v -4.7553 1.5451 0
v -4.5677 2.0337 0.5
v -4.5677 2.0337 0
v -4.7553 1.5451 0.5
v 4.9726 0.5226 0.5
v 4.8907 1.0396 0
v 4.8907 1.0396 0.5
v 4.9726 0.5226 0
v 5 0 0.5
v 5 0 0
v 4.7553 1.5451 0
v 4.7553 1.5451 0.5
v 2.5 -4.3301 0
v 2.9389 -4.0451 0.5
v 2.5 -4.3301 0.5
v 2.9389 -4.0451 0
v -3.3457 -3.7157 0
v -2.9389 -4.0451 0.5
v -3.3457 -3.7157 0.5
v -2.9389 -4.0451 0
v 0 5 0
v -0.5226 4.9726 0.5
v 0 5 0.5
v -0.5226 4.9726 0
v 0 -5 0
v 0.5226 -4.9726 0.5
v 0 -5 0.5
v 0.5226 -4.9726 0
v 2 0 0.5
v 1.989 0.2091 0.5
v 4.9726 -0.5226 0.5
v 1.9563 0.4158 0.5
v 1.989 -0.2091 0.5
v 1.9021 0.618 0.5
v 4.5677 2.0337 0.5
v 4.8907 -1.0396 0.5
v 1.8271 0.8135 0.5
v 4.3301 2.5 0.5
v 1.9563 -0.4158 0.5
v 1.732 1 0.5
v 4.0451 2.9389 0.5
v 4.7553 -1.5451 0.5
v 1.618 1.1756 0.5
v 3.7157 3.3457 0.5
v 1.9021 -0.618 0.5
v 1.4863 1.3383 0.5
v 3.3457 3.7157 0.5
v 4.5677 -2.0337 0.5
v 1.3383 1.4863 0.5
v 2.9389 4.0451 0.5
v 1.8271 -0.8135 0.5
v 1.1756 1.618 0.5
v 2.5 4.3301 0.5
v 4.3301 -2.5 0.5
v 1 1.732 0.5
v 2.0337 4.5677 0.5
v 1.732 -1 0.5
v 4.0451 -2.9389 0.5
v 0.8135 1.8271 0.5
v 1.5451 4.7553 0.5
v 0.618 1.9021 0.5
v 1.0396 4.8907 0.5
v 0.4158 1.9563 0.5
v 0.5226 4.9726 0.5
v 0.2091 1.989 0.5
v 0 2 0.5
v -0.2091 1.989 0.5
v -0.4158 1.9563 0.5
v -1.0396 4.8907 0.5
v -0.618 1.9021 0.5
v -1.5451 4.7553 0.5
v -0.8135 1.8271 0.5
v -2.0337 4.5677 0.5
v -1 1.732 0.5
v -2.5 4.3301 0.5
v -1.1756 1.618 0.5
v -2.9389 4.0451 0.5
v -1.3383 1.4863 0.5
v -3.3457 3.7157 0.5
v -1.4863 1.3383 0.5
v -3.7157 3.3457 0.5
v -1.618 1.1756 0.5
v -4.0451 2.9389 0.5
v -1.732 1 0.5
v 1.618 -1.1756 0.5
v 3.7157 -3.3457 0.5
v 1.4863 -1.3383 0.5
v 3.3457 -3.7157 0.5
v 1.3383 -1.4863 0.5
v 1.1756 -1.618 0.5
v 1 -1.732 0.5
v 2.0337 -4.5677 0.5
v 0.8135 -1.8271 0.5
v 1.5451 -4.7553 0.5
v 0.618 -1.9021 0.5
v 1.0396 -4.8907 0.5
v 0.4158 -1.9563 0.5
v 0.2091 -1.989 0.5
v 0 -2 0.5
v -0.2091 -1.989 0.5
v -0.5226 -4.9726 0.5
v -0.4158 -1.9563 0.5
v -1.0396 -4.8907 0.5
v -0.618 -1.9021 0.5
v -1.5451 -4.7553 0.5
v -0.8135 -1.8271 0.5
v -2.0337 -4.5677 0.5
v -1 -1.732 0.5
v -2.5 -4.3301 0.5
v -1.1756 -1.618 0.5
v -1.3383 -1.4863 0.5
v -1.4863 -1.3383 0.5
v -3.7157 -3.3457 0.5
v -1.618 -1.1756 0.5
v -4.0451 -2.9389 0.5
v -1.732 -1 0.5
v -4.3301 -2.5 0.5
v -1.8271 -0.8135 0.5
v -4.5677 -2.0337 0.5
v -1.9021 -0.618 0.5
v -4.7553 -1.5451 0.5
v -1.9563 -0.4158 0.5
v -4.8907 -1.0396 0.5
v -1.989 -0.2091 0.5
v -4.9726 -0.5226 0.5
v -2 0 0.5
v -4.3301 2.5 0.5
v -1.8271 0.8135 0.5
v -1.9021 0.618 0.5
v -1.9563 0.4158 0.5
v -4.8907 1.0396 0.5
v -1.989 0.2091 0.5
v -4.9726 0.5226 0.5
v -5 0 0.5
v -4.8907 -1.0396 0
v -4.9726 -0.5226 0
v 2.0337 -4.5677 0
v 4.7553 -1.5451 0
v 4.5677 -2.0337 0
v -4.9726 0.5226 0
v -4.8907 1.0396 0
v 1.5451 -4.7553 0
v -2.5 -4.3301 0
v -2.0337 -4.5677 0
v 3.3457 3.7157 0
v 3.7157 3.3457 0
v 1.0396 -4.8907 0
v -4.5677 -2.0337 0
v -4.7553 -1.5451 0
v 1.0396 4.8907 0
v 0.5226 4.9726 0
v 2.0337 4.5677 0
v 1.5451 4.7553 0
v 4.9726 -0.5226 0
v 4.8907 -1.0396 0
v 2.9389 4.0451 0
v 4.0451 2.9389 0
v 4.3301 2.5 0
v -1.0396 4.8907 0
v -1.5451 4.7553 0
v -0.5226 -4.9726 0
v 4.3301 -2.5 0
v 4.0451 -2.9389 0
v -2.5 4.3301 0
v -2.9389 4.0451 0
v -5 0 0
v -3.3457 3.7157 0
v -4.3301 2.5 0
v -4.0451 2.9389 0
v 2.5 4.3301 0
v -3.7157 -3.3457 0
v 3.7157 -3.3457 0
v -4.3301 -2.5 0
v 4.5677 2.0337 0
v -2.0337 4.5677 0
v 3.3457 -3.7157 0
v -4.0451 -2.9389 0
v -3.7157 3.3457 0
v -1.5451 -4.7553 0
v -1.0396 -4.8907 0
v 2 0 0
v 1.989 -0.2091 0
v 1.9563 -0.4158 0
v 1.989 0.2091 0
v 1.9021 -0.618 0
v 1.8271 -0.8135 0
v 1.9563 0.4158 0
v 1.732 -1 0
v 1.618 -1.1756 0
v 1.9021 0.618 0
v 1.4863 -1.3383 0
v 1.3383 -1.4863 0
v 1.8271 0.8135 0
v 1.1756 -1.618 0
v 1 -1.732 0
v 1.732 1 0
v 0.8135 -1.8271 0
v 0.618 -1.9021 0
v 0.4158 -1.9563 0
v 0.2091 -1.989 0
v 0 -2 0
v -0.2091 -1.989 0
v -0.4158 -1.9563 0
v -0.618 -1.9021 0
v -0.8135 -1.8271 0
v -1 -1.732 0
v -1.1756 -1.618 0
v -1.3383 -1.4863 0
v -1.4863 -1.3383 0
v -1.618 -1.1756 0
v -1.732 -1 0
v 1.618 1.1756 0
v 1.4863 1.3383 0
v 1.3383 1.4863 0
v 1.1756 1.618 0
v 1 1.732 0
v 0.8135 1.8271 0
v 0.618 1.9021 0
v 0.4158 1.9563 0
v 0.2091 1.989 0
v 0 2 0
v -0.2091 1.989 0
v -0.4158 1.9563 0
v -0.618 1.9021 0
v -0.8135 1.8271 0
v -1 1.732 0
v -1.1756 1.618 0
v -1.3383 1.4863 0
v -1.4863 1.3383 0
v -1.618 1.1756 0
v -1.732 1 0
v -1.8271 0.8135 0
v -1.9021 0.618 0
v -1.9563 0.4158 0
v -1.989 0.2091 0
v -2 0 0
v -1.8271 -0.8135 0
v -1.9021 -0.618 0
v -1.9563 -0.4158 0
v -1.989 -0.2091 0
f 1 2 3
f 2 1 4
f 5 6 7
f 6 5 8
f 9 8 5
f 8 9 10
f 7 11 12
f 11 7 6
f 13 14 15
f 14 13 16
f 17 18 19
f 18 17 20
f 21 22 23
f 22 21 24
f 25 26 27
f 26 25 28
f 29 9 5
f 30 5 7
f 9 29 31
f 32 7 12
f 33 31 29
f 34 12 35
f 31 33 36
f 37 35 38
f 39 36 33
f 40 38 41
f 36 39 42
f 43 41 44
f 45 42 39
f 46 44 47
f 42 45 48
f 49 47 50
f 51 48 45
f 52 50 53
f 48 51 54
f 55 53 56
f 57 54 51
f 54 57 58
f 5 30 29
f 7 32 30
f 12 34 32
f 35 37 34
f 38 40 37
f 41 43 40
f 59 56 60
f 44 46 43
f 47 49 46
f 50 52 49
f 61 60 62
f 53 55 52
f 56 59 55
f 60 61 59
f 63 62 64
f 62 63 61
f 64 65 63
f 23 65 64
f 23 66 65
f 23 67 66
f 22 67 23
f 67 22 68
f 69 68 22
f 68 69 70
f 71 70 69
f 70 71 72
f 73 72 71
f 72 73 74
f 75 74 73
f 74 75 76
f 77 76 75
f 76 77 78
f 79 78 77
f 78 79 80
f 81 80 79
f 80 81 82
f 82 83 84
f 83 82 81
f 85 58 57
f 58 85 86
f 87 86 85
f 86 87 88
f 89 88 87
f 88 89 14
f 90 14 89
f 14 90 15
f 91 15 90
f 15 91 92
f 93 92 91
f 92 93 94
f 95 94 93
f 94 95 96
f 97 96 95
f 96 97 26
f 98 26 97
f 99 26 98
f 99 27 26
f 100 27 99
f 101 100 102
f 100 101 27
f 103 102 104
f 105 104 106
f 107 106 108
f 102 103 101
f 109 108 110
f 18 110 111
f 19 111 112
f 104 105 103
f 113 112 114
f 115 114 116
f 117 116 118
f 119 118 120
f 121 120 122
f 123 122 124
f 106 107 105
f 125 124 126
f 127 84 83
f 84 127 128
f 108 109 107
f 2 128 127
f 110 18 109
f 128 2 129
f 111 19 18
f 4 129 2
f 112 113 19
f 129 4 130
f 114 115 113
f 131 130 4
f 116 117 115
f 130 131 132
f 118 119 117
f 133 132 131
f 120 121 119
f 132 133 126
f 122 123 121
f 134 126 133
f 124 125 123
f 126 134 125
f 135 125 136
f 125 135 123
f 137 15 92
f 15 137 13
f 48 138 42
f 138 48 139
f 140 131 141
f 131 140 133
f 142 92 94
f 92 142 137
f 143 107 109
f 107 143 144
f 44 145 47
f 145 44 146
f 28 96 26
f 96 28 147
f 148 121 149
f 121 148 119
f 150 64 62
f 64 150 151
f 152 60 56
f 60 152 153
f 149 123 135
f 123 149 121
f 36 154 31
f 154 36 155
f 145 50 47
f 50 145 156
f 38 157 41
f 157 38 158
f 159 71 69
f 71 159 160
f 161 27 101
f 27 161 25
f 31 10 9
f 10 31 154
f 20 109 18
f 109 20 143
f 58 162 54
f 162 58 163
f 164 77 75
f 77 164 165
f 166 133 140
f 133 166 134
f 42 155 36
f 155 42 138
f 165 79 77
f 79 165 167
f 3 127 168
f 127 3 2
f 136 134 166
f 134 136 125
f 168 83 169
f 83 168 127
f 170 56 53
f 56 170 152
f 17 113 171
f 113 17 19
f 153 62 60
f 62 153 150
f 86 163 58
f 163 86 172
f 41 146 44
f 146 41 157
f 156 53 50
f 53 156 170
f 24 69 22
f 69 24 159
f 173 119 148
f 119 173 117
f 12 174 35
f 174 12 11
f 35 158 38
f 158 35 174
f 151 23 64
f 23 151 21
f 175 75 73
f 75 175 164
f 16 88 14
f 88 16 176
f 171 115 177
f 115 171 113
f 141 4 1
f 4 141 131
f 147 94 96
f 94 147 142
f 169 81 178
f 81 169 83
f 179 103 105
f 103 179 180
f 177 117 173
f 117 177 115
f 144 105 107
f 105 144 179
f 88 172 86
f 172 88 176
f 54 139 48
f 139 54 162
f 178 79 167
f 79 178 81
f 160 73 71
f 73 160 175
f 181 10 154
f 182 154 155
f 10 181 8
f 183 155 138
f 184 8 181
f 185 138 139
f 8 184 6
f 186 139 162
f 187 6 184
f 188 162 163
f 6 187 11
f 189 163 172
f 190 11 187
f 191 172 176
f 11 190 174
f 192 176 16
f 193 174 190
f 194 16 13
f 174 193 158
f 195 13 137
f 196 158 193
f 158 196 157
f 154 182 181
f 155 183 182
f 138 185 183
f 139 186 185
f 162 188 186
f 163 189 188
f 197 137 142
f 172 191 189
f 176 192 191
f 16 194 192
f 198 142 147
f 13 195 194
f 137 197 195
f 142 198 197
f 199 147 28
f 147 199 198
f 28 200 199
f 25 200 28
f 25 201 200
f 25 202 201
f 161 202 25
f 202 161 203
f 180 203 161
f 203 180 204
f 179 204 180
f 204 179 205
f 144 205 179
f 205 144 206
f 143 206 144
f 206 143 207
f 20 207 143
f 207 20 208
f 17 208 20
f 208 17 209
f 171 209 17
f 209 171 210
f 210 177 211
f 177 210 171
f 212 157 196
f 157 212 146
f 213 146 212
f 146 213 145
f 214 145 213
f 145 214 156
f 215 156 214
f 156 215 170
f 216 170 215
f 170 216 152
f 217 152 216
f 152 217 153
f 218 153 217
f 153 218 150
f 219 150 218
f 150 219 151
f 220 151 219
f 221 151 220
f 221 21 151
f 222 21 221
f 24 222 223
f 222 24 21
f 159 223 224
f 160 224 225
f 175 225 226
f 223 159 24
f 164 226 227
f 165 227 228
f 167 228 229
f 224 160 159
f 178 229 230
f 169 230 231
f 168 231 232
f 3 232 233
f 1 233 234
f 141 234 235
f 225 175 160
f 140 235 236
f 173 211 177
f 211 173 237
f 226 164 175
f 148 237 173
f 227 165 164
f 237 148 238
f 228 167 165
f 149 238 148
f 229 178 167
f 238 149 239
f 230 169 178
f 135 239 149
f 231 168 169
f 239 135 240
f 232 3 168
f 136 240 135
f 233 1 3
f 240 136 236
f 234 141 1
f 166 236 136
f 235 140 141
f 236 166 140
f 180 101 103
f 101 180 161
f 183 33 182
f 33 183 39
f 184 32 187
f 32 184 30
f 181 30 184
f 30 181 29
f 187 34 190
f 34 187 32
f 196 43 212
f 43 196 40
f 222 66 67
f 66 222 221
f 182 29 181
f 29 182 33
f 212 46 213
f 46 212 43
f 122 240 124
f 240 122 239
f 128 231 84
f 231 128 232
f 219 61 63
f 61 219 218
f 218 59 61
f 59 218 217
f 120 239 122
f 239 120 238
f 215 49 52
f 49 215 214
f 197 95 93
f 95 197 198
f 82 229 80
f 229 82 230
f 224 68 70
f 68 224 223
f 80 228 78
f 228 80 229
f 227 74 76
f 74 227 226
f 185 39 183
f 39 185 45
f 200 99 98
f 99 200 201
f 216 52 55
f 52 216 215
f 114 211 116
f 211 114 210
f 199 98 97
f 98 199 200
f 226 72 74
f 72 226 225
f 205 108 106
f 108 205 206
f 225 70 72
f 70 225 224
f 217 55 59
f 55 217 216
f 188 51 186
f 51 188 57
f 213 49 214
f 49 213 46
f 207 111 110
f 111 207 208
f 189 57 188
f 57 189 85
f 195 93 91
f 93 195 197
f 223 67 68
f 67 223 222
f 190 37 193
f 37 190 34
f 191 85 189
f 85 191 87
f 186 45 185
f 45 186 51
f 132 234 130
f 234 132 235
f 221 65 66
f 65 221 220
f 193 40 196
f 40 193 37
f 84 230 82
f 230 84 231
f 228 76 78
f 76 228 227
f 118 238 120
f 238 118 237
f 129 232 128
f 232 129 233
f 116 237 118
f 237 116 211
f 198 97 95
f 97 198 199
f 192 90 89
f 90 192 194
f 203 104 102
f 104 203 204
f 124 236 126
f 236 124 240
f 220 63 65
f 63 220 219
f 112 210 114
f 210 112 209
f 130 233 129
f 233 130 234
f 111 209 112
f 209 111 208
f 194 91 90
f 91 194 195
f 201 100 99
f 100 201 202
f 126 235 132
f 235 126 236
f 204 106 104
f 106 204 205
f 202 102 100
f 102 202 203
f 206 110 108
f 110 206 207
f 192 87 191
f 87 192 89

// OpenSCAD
// Precision shim ring.
$fn = 60;
eps = 0.02;
inner_d = 4;
outer_d = 10;
thickness = 0.5;
difference() {
    cylinder(d = outer_d, h = thickness);
    translate([0, 0, -eps]) cylinder(d = inner_d, h = thickness + 2 * eps);
}
